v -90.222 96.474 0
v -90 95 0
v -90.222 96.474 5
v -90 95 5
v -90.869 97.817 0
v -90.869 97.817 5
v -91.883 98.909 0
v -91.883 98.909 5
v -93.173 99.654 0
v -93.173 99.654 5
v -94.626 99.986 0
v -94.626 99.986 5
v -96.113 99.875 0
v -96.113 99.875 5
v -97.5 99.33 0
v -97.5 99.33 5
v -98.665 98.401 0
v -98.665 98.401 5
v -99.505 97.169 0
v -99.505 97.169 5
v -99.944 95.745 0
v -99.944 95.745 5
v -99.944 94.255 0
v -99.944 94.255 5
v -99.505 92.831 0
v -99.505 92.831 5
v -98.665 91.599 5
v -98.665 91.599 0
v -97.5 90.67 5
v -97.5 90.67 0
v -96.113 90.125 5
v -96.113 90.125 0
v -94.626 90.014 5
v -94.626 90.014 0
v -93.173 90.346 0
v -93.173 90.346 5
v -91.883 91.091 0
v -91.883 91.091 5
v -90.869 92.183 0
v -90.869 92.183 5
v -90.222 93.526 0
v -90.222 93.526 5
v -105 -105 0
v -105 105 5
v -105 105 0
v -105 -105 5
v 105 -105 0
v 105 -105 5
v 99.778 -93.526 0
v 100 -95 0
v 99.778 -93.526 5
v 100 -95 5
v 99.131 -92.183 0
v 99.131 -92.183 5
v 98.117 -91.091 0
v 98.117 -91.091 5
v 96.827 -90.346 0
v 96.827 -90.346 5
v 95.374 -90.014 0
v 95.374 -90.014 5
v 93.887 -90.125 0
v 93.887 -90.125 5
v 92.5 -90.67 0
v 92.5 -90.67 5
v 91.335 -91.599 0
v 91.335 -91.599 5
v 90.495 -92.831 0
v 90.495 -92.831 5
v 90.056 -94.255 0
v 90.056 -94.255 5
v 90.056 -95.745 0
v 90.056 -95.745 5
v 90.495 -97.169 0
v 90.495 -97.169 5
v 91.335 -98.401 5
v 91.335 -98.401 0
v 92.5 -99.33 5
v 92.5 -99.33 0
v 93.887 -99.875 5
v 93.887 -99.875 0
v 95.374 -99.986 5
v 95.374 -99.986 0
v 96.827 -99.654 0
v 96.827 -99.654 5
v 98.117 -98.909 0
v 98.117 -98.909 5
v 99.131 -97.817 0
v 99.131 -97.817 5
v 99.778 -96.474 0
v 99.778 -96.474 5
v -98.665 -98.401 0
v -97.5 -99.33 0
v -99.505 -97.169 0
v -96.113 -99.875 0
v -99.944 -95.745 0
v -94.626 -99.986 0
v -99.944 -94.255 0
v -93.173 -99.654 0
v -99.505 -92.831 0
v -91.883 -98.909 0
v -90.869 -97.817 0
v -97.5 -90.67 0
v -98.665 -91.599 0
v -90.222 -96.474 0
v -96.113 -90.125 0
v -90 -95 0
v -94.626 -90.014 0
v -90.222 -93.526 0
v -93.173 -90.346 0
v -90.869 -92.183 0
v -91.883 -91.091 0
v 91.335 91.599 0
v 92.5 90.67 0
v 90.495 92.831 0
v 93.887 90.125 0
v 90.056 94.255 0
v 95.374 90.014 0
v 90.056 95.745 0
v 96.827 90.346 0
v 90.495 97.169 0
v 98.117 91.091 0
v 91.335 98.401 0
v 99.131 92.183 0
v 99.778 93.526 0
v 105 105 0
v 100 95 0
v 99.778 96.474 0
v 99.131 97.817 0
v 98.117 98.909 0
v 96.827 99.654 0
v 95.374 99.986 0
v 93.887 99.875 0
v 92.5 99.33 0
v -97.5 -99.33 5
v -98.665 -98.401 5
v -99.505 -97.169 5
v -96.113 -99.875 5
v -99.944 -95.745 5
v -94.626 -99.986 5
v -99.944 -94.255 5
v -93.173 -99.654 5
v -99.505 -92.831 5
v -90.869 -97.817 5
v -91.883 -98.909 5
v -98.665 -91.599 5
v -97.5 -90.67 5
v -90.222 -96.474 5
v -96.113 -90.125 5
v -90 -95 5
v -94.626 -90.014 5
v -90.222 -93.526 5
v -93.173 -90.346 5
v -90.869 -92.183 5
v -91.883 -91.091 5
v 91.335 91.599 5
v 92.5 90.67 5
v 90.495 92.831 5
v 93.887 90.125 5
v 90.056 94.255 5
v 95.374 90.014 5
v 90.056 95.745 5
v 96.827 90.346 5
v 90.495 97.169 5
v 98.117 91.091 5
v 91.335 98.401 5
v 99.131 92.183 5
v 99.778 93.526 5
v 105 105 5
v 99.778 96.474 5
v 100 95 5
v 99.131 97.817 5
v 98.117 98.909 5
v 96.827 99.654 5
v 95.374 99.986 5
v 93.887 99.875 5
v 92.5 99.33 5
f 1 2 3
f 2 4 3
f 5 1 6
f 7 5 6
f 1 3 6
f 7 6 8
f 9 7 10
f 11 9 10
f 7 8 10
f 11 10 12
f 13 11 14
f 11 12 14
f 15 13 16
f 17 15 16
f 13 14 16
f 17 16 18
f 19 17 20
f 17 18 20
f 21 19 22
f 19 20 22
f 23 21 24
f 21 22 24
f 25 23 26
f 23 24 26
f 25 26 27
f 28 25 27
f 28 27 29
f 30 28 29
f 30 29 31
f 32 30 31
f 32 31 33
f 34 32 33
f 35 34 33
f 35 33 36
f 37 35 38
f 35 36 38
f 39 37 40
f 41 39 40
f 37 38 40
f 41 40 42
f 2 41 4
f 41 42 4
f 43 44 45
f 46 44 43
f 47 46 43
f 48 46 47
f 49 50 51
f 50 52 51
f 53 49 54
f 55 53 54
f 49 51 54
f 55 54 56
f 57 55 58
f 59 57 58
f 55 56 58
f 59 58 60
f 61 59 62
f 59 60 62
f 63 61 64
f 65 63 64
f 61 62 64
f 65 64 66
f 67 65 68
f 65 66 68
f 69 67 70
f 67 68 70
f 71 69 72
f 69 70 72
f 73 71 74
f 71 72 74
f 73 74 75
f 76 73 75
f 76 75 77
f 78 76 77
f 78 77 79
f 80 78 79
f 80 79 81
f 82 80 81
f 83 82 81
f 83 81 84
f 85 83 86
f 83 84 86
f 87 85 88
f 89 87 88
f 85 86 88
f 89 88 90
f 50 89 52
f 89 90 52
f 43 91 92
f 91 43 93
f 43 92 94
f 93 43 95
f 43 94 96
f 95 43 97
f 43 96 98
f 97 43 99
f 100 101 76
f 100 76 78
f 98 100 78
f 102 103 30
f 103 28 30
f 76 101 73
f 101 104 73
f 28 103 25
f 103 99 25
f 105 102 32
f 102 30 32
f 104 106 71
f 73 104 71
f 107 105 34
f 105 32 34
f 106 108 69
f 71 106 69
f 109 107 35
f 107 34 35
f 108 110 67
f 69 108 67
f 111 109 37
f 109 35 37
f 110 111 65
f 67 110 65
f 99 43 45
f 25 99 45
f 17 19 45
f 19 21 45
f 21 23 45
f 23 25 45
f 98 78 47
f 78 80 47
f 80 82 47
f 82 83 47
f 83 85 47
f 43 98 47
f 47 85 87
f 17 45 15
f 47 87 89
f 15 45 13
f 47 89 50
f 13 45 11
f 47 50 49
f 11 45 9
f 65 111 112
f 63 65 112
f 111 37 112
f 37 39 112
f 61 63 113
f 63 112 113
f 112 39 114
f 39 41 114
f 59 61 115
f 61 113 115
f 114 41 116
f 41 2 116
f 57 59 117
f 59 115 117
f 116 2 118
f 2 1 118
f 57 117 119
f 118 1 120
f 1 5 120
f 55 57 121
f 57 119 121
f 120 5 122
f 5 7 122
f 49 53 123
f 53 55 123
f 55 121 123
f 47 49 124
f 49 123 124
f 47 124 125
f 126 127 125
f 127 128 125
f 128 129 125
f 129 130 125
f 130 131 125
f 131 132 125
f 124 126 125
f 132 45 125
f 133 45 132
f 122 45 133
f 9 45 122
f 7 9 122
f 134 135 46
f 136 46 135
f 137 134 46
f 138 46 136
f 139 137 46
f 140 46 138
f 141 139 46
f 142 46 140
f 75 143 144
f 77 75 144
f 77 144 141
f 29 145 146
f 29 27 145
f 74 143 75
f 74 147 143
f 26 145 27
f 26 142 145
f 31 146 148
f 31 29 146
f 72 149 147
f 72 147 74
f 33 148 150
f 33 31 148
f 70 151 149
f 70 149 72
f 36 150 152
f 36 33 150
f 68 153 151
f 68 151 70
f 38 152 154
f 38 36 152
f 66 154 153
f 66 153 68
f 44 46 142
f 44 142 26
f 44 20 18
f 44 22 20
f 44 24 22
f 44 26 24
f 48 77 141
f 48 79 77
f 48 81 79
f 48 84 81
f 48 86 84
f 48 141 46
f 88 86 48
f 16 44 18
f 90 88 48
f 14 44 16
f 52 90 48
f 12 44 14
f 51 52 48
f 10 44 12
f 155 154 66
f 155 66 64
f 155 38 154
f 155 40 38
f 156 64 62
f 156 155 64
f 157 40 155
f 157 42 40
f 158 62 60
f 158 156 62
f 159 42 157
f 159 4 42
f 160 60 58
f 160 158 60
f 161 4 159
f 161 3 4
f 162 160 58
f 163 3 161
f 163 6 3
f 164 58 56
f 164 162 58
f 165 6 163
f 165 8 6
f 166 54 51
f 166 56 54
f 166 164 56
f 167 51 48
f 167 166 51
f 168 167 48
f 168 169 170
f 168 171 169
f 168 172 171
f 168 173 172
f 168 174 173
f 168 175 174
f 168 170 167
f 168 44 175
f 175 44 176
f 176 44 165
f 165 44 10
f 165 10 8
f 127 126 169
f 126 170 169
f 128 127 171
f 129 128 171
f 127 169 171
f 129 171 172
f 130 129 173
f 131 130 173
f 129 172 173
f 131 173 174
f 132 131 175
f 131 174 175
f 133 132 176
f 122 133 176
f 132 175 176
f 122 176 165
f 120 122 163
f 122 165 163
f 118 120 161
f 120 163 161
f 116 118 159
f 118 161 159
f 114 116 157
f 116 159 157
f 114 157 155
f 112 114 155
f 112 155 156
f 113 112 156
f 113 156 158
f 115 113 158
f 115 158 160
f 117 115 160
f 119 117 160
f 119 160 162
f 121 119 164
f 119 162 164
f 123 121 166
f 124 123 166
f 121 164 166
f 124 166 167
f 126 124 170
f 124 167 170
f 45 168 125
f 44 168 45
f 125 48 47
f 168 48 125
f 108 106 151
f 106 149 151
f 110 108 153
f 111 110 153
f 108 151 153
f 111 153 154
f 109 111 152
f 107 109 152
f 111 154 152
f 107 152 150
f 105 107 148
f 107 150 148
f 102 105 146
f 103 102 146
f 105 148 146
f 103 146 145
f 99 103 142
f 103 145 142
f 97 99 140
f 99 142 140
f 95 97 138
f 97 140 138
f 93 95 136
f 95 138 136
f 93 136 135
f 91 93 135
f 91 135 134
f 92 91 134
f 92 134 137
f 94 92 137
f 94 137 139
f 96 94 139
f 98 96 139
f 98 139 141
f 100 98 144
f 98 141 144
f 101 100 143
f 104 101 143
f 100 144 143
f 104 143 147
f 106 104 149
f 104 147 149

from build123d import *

# Parameters (mm, degrees)
F0_W = 210
F0_H = 210
F3_R = 5


with BuildPart() as f2:
    # F2: sweep along a path in F1
    with BuildLine(Plane.XZ) as f2_path:
        Line((0, 0), (0, 5))
    # F0 (on Top) → F2 (sweep)
    with BuildSketch(Plane.XY):
        Rectangle(F0_W, F0_H)
    sweep(path=f2_path.line)

    # F5: sweep along a path in F4
    with BuildLine(Plane.XZ) as f5_path:
        Line((0, 0), (0, 10))
    # F3 (on Top) → F5 (sweep, cut)
    with BuildSketch(Plane.XY):
        with Locations((-95, -95)):
            Circle(F3_R)
        with Locations((95, 95)):
            Circle(F3_R)
        with Locations((-95, 95)):
            Circle(F3_R)
        with Locations((95, -95)):
            Circle(F3_R)
    sweep(path=f5_path.line, mode=Mode.SUBTRACT)


solid = f2.part
